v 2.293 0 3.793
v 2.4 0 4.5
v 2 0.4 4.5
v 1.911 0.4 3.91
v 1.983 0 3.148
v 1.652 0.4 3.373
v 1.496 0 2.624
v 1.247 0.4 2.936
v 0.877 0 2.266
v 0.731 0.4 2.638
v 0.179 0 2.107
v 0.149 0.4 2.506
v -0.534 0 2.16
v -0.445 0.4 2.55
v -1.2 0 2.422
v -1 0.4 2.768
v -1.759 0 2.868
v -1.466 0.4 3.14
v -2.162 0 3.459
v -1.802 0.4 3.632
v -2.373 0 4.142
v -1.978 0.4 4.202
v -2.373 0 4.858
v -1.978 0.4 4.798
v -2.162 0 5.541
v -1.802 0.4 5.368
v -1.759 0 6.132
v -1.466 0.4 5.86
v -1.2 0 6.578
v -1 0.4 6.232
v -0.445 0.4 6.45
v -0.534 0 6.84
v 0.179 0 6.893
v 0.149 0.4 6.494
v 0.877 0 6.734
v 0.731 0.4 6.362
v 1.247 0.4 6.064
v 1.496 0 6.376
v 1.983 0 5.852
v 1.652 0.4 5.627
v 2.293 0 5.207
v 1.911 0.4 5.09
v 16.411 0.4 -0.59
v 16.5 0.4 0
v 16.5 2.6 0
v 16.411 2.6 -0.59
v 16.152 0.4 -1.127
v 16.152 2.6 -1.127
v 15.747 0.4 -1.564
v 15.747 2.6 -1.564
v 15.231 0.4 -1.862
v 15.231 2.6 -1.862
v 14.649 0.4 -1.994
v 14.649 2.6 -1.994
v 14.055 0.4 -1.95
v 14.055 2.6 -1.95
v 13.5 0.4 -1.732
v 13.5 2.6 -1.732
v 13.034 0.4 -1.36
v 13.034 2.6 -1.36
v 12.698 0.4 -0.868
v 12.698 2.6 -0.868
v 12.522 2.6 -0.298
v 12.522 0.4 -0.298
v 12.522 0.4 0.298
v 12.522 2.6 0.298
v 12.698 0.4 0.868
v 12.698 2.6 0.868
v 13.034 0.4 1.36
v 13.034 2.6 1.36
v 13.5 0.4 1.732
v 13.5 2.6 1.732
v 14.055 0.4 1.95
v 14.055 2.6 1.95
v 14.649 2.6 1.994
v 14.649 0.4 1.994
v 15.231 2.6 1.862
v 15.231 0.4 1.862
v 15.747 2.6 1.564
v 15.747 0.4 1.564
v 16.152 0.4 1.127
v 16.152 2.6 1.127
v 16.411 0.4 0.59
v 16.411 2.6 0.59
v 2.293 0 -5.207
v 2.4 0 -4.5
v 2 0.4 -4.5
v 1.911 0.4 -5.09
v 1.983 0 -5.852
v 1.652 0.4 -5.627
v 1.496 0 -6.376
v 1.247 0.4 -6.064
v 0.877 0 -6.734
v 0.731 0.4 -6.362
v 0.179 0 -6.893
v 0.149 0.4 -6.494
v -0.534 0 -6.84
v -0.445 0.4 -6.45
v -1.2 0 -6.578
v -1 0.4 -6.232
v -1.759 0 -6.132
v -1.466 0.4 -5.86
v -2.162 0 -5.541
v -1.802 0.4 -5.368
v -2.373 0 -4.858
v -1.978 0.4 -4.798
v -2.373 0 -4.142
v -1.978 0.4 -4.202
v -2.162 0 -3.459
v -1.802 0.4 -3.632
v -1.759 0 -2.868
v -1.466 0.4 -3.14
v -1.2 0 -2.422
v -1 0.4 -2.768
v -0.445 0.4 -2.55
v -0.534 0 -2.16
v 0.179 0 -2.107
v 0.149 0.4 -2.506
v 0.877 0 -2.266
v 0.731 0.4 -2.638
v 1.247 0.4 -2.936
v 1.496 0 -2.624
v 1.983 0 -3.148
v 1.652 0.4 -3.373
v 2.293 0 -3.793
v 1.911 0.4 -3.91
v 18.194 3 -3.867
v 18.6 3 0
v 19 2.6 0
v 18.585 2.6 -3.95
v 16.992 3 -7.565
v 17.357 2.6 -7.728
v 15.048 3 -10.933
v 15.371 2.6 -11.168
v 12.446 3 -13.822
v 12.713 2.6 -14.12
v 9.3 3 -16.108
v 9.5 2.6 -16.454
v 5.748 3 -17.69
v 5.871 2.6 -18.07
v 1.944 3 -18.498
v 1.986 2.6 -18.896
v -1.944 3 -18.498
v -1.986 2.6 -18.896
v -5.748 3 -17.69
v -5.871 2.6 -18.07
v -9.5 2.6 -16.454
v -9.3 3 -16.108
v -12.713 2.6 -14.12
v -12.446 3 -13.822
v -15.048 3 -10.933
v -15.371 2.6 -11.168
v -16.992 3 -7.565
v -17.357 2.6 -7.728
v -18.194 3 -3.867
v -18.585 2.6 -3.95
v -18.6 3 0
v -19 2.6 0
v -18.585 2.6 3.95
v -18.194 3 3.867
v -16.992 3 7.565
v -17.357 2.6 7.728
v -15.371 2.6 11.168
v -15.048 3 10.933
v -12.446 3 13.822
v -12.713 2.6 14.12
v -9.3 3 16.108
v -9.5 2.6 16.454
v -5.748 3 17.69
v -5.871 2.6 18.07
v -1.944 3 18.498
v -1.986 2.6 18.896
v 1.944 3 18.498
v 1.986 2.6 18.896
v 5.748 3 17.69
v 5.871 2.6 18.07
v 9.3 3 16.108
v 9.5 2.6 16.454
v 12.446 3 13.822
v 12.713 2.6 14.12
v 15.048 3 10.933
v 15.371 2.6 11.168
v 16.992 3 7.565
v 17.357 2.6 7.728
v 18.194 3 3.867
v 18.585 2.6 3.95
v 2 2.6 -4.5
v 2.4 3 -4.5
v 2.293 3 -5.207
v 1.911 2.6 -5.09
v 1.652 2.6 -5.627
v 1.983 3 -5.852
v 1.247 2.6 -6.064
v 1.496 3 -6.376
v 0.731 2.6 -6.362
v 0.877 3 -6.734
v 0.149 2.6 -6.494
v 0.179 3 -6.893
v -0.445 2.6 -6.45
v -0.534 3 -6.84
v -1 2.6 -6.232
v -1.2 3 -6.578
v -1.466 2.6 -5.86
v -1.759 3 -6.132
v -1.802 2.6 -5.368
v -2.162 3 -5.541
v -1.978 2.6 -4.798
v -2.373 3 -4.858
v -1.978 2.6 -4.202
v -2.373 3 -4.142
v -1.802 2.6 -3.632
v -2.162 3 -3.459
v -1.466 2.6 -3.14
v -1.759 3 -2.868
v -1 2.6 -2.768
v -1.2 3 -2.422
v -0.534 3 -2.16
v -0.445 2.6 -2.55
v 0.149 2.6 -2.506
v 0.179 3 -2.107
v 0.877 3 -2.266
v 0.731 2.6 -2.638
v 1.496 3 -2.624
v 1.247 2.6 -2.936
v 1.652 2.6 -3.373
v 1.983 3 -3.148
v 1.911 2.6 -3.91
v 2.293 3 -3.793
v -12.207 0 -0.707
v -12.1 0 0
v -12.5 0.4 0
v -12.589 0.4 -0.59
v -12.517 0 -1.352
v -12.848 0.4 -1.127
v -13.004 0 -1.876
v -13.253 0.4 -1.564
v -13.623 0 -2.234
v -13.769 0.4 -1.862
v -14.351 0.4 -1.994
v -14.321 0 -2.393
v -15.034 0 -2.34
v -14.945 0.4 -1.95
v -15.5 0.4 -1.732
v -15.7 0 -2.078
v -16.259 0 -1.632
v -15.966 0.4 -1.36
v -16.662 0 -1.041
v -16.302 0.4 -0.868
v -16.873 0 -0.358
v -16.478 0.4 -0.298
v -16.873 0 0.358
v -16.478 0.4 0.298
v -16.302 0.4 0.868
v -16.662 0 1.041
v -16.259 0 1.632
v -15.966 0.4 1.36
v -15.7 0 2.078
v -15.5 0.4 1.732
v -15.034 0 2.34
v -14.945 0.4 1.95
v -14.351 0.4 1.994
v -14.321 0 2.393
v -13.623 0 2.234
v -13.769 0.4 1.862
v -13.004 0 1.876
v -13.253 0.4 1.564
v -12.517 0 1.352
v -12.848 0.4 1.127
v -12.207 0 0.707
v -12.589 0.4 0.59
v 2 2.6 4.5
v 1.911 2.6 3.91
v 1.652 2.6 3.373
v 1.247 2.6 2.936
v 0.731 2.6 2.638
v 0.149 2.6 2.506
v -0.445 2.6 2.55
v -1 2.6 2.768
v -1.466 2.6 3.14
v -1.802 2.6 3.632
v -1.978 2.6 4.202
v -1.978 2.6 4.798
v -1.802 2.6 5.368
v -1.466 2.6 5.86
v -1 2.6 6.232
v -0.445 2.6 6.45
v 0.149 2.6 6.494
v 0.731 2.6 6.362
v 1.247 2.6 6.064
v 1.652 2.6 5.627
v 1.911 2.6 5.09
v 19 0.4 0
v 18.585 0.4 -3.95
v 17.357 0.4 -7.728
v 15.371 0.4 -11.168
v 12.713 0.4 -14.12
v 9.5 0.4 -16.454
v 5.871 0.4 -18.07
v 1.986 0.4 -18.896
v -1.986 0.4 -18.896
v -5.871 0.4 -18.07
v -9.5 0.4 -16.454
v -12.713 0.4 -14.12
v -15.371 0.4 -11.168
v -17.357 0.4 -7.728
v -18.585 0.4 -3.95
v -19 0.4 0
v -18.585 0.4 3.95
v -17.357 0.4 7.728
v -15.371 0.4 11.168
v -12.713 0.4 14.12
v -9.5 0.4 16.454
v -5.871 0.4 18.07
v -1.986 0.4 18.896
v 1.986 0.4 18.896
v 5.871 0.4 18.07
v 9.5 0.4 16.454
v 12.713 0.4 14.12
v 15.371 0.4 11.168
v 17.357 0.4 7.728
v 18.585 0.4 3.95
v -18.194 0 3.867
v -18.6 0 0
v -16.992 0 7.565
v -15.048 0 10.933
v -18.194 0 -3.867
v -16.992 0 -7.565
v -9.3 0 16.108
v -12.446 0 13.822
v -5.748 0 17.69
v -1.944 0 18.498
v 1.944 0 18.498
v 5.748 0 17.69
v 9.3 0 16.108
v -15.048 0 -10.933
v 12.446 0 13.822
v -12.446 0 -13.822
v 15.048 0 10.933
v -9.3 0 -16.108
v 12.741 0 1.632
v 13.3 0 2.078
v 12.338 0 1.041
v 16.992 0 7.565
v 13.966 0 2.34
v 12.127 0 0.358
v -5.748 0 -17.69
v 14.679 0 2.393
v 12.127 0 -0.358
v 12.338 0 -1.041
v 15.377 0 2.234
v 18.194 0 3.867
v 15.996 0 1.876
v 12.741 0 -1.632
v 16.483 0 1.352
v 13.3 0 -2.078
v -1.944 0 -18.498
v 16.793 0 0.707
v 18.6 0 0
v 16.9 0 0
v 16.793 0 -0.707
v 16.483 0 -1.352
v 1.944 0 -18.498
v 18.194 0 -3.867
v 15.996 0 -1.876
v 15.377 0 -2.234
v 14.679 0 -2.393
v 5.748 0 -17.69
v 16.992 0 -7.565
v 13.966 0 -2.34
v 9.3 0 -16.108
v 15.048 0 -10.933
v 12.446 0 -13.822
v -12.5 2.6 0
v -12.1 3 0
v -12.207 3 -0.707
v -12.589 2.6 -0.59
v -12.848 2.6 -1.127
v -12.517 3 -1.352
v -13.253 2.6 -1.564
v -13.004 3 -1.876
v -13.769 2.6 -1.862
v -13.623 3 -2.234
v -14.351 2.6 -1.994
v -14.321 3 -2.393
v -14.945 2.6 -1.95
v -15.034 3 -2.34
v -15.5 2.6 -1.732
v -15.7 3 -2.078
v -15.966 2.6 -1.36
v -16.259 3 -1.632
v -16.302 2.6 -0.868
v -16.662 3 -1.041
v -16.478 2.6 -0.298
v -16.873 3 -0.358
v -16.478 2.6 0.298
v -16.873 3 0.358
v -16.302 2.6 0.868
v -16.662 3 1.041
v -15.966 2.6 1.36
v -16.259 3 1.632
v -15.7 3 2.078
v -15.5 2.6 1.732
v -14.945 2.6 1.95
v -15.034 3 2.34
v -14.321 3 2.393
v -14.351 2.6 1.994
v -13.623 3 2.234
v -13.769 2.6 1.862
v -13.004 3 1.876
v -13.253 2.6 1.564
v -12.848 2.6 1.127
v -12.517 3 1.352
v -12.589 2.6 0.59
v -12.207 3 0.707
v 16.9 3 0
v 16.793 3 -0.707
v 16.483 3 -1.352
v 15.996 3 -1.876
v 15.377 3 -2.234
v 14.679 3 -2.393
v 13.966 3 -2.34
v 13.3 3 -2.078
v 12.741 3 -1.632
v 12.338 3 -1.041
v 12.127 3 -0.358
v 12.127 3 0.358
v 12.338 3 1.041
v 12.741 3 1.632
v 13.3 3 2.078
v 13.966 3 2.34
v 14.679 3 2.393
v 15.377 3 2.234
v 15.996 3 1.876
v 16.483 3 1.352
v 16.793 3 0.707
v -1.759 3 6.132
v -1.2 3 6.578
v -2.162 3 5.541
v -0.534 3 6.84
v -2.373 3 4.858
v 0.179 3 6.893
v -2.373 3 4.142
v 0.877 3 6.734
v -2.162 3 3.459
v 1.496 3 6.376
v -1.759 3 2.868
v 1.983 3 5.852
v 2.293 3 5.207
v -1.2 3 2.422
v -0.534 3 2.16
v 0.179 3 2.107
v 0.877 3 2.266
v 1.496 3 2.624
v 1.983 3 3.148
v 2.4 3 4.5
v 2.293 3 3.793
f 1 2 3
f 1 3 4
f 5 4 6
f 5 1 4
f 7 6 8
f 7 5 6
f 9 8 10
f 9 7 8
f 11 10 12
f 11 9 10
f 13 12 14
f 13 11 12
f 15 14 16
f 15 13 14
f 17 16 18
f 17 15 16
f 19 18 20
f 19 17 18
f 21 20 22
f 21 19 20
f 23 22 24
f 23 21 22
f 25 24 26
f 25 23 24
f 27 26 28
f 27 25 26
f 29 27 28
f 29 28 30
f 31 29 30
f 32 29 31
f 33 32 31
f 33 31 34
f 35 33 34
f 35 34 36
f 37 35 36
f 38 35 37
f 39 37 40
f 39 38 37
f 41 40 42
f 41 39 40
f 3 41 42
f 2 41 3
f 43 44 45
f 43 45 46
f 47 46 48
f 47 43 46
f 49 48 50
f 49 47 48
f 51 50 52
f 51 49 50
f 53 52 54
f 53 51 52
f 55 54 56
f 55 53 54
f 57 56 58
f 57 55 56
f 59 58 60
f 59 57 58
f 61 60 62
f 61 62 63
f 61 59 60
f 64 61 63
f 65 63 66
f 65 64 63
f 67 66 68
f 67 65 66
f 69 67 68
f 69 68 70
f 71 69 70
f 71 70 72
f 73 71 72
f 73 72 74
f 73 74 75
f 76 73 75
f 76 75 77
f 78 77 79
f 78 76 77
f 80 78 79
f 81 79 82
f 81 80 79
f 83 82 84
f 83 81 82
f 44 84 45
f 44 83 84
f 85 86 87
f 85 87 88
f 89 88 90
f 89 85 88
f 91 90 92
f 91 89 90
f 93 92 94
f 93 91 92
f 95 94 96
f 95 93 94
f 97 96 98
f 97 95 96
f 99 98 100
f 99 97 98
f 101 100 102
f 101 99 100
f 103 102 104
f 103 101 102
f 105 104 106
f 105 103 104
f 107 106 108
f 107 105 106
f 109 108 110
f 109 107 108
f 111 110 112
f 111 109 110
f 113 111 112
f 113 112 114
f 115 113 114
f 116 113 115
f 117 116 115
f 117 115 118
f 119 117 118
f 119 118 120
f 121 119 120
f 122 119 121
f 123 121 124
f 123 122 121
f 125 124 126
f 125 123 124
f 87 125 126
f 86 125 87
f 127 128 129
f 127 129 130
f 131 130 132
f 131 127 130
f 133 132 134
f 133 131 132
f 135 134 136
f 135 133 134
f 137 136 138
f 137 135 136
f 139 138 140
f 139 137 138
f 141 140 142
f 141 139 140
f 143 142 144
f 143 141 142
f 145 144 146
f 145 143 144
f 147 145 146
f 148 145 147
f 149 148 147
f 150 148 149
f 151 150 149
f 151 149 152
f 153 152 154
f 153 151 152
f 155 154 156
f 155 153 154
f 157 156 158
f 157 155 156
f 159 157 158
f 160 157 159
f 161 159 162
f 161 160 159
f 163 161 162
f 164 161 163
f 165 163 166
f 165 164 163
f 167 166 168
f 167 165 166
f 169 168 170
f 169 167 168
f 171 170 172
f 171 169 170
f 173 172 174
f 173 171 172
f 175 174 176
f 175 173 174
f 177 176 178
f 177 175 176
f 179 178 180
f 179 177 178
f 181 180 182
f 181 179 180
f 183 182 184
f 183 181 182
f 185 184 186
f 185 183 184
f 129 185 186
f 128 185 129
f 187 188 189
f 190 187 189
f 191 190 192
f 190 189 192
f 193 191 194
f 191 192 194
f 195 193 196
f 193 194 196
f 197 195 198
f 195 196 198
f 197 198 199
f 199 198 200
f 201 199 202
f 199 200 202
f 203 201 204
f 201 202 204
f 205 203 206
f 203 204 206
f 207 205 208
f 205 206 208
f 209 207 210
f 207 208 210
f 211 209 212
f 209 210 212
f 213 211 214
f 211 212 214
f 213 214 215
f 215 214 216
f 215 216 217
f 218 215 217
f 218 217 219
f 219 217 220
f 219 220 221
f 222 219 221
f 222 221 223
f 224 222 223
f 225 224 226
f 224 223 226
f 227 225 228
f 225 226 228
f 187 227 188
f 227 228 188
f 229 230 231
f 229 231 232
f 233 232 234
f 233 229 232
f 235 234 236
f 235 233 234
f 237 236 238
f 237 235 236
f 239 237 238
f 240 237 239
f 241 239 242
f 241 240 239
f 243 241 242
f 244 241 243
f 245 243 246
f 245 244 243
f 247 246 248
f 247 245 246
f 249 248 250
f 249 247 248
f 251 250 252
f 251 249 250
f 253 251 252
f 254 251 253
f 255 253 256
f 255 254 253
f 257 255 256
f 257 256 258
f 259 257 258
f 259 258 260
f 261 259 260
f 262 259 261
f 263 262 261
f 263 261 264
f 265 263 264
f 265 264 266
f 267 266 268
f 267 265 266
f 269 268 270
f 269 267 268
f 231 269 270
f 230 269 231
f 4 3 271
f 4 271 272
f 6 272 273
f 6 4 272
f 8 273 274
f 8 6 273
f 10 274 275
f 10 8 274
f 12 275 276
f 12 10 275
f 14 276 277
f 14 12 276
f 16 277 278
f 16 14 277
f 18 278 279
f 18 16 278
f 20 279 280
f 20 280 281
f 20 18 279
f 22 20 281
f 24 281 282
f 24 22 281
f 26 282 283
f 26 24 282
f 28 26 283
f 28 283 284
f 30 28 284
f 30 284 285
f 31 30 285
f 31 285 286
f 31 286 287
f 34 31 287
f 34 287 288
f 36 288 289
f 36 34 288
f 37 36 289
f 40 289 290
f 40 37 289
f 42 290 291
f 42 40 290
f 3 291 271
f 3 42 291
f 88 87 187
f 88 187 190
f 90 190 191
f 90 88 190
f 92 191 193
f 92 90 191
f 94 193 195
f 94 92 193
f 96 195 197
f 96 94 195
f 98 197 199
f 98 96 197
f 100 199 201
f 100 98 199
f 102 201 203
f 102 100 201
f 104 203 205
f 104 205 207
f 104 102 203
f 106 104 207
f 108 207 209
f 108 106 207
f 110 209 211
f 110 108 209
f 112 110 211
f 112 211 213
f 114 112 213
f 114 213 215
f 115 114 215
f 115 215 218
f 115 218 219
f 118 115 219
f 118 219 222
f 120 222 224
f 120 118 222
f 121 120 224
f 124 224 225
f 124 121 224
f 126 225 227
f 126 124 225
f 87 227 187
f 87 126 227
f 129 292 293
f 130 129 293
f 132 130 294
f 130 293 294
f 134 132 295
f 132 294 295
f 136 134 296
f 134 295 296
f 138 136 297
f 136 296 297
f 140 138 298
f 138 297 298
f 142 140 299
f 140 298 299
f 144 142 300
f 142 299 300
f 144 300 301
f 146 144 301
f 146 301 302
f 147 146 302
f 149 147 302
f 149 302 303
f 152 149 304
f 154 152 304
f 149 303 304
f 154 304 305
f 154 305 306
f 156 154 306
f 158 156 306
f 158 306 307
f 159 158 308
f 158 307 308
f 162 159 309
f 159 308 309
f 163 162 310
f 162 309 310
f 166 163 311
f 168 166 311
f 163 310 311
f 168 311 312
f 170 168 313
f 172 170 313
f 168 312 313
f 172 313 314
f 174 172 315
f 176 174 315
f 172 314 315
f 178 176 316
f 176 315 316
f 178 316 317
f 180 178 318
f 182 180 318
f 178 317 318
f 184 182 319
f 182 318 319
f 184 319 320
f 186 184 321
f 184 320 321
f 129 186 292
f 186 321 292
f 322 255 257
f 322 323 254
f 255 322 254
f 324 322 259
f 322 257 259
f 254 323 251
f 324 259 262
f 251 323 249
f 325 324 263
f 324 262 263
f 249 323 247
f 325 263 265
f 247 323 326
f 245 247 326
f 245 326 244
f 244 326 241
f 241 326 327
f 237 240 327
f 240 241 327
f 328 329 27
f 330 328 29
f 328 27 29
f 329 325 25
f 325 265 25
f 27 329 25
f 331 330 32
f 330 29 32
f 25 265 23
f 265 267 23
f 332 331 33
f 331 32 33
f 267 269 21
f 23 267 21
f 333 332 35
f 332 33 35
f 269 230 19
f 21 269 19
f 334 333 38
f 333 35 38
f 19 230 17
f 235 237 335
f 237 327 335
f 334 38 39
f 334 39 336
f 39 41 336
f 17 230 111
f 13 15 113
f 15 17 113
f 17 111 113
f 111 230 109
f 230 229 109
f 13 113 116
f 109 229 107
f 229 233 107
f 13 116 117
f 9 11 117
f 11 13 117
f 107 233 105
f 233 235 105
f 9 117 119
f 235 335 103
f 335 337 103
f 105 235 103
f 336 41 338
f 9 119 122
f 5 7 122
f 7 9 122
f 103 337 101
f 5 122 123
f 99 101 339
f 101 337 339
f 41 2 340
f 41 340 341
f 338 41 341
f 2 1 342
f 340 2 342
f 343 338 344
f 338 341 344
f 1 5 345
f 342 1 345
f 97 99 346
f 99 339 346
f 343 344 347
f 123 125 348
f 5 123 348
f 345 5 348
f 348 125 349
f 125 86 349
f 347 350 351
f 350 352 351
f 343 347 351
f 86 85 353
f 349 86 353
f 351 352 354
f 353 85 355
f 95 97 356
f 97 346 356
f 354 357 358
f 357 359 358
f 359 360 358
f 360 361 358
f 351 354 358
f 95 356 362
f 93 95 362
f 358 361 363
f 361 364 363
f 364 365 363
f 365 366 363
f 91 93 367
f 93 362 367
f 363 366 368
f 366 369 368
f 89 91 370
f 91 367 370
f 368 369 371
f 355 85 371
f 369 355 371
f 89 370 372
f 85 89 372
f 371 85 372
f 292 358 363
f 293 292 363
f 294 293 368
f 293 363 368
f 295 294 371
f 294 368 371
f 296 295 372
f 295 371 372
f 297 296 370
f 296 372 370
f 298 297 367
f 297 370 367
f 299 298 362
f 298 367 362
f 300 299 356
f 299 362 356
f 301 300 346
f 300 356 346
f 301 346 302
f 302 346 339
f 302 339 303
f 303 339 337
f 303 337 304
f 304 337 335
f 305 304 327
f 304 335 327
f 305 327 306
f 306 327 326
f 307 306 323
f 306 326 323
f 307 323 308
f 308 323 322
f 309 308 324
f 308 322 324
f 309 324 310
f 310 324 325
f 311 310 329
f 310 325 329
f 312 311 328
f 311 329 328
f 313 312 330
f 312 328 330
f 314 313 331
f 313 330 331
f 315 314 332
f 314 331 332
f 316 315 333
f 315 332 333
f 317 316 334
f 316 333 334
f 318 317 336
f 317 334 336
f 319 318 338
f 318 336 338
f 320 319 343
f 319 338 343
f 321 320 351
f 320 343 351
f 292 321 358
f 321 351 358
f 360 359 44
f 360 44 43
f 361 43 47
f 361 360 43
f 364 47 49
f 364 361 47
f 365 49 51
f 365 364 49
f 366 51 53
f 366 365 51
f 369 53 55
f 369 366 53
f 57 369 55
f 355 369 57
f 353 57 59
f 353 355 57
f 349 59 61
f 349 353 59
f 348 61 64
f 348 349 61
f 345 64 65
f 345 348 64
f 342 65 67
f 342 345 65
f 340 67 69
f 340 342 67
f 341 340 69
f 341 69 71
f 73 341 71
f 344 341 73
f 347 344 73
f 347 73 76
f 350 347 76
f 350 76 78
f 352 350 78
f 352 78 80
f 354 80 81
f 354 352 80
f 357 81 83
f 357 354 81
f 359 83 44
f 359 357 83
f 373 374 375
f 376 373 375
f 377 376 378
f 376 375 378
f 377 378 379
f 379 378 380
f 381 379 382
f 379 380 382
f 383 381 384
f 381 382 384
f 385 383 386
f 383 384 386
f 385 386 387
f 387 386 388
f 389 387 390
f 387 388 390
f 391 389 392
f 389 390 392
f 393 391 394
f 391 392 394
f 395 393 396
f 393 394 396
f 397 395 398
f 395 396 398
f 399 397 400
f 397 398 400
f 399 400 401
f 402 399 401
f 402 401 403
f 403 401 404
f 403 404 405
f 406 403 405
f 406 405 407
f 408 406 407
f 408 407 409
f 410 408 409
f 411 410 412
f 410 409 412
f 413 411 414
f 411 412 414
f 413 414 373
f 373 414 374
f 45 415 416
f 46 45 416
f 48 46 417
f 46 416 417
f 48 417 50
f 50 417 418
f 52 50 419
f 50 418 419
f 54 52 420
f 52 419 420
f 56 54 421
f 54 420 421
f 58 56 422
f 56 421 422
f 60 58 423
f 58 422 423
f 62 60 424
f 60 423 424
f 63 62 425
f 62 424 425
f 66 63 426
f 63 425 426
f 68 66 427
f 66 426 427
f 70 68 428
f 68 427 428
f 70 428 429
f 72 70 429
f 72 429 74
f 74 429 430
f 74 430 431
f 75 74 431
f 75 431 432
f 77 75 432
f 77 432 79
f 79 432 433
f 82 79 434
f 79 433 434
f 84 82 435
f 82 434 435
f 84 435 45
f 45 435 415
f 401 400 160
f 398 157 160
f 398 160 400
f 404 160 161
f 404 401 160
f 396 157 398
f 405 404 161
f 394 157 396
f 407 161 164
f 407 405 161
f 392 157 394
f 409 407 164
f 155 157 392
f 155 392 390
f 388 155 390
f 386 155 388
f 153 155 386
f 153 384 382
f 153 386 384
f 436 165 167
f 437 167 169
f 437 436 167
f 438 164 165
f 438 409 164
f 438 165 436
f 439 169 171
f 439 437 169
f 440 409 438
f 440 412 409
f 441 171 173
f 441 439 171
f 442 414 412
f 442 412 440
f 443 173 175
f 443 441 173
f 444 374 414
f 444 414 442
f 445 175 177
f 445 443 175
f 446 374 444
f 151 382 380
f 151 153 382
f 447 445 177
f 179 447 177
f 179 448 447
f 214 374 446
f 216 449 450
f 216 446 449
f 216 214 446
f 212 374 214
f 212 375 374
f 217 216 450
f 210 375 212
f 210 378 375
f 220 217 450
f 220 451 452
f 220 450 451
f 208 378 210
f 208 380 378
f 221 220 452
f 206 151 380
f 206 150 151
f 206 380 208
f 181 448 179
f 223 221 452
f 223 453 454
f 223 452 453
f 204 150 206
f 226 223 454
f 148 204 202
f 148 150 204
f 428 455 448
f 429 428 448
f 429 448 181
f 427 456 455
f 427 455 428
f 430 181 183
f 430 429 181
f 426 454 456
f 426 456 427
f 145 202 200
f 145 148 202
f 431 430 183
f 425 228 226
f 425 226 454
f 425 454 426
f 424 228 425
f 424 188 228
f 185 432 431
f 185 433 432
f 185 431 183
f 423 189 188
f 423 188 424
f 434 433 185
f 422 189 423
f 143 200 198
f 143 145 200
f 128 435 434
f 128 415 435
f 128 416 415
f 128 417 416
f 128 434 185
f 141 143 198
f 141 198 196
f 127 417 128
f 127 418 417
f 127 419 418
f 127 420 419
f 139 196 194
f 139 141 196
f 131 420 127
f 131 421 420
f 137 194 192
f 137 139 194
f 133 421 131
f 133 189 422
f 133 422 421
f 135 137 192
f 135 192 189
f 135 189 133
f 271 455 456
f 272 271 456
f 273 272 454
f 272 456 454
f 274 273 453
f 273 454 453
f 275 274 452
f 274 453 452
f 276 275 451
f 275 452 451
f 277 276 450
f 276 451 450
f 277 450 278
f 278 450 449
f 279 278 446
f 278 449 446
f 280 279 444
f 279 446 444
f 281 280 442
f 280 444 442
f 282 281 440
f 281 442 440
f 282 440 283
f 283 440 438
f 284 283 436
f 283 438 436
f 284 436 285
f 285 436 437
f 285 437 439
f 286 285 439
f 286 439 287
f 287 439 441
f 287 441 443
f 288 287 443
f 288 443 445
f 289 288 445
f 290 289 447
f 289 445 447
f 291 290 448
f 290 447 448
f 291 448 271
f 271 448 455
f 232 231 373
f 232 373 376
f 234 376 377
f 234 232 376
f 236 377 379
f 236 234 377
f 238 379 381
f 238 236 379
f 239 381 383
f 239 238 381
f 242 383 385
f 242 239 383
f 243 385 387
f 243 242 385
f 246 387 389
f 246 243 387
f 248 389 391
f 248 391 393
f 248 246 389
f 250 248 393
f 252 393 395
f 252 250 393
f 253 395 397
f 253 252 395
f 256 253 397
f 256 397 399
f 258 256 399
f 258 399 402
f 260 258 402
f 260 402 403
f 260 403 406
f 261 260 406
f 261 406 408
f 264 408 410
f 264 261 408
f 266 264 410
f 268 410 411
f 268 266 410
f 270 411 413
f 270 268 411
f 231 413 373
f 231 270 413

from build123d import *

# Parameters (mm, degrees)
SKETCH1_R           = 19
SKETCH1_R_2         = 2
BOSS_EXTRUDE1_DEPTH = 3
CHAMFER1_SIZE       = 0.4


with BuildPart() as part:
    # Sketch1 → Boss-Extrude1 (new body)
    with BuildSketch(Plane(origin=(0, 0, 0), x_dir=(1, 0, 0), z_dir=(0, 1, 0))):
        Circle(SKETCH1_R)
        with Locations((-14.5, 0)):
            Circle(SKETCH1_R_2, mode=Mode.SUBTRACT)
        with Locations((14.5, 0)):
            Circle(SKETCH1_R_2, mode=Mode.SUBTRACT)
        with Locations((0, 4.5)):
            Circle(SKETCH1_R_2, mode=Mode.SUBTRACT)
        with Locations((0, -4.5)):
            Circle(SKETCH1_R_2, mode=Mode.SUBTRACT)
    extrude(amount=BOSS_EXTRUDE1_DEPTH)

    # Chamfer1
    chamfer1_edges = [part.edges().sort_by_distance(p)[0] for p in [
        (-2, 0, -4.5),
        (-2, 3, -4.5),
        (-2, 0, 4.5),
        (-2, 3, 4.5),
        (-19, 0, 0),
        (-19, 3, 0),
        (-16.5, 0, 0),
        (-16.5, 3, 0),
        (12.5, 0, 0),
        (12.5, 3, 0),
    ]]
    chamfer(chamfer1_edges, length=CHAMFER1_SIZE)


solid = part.part
